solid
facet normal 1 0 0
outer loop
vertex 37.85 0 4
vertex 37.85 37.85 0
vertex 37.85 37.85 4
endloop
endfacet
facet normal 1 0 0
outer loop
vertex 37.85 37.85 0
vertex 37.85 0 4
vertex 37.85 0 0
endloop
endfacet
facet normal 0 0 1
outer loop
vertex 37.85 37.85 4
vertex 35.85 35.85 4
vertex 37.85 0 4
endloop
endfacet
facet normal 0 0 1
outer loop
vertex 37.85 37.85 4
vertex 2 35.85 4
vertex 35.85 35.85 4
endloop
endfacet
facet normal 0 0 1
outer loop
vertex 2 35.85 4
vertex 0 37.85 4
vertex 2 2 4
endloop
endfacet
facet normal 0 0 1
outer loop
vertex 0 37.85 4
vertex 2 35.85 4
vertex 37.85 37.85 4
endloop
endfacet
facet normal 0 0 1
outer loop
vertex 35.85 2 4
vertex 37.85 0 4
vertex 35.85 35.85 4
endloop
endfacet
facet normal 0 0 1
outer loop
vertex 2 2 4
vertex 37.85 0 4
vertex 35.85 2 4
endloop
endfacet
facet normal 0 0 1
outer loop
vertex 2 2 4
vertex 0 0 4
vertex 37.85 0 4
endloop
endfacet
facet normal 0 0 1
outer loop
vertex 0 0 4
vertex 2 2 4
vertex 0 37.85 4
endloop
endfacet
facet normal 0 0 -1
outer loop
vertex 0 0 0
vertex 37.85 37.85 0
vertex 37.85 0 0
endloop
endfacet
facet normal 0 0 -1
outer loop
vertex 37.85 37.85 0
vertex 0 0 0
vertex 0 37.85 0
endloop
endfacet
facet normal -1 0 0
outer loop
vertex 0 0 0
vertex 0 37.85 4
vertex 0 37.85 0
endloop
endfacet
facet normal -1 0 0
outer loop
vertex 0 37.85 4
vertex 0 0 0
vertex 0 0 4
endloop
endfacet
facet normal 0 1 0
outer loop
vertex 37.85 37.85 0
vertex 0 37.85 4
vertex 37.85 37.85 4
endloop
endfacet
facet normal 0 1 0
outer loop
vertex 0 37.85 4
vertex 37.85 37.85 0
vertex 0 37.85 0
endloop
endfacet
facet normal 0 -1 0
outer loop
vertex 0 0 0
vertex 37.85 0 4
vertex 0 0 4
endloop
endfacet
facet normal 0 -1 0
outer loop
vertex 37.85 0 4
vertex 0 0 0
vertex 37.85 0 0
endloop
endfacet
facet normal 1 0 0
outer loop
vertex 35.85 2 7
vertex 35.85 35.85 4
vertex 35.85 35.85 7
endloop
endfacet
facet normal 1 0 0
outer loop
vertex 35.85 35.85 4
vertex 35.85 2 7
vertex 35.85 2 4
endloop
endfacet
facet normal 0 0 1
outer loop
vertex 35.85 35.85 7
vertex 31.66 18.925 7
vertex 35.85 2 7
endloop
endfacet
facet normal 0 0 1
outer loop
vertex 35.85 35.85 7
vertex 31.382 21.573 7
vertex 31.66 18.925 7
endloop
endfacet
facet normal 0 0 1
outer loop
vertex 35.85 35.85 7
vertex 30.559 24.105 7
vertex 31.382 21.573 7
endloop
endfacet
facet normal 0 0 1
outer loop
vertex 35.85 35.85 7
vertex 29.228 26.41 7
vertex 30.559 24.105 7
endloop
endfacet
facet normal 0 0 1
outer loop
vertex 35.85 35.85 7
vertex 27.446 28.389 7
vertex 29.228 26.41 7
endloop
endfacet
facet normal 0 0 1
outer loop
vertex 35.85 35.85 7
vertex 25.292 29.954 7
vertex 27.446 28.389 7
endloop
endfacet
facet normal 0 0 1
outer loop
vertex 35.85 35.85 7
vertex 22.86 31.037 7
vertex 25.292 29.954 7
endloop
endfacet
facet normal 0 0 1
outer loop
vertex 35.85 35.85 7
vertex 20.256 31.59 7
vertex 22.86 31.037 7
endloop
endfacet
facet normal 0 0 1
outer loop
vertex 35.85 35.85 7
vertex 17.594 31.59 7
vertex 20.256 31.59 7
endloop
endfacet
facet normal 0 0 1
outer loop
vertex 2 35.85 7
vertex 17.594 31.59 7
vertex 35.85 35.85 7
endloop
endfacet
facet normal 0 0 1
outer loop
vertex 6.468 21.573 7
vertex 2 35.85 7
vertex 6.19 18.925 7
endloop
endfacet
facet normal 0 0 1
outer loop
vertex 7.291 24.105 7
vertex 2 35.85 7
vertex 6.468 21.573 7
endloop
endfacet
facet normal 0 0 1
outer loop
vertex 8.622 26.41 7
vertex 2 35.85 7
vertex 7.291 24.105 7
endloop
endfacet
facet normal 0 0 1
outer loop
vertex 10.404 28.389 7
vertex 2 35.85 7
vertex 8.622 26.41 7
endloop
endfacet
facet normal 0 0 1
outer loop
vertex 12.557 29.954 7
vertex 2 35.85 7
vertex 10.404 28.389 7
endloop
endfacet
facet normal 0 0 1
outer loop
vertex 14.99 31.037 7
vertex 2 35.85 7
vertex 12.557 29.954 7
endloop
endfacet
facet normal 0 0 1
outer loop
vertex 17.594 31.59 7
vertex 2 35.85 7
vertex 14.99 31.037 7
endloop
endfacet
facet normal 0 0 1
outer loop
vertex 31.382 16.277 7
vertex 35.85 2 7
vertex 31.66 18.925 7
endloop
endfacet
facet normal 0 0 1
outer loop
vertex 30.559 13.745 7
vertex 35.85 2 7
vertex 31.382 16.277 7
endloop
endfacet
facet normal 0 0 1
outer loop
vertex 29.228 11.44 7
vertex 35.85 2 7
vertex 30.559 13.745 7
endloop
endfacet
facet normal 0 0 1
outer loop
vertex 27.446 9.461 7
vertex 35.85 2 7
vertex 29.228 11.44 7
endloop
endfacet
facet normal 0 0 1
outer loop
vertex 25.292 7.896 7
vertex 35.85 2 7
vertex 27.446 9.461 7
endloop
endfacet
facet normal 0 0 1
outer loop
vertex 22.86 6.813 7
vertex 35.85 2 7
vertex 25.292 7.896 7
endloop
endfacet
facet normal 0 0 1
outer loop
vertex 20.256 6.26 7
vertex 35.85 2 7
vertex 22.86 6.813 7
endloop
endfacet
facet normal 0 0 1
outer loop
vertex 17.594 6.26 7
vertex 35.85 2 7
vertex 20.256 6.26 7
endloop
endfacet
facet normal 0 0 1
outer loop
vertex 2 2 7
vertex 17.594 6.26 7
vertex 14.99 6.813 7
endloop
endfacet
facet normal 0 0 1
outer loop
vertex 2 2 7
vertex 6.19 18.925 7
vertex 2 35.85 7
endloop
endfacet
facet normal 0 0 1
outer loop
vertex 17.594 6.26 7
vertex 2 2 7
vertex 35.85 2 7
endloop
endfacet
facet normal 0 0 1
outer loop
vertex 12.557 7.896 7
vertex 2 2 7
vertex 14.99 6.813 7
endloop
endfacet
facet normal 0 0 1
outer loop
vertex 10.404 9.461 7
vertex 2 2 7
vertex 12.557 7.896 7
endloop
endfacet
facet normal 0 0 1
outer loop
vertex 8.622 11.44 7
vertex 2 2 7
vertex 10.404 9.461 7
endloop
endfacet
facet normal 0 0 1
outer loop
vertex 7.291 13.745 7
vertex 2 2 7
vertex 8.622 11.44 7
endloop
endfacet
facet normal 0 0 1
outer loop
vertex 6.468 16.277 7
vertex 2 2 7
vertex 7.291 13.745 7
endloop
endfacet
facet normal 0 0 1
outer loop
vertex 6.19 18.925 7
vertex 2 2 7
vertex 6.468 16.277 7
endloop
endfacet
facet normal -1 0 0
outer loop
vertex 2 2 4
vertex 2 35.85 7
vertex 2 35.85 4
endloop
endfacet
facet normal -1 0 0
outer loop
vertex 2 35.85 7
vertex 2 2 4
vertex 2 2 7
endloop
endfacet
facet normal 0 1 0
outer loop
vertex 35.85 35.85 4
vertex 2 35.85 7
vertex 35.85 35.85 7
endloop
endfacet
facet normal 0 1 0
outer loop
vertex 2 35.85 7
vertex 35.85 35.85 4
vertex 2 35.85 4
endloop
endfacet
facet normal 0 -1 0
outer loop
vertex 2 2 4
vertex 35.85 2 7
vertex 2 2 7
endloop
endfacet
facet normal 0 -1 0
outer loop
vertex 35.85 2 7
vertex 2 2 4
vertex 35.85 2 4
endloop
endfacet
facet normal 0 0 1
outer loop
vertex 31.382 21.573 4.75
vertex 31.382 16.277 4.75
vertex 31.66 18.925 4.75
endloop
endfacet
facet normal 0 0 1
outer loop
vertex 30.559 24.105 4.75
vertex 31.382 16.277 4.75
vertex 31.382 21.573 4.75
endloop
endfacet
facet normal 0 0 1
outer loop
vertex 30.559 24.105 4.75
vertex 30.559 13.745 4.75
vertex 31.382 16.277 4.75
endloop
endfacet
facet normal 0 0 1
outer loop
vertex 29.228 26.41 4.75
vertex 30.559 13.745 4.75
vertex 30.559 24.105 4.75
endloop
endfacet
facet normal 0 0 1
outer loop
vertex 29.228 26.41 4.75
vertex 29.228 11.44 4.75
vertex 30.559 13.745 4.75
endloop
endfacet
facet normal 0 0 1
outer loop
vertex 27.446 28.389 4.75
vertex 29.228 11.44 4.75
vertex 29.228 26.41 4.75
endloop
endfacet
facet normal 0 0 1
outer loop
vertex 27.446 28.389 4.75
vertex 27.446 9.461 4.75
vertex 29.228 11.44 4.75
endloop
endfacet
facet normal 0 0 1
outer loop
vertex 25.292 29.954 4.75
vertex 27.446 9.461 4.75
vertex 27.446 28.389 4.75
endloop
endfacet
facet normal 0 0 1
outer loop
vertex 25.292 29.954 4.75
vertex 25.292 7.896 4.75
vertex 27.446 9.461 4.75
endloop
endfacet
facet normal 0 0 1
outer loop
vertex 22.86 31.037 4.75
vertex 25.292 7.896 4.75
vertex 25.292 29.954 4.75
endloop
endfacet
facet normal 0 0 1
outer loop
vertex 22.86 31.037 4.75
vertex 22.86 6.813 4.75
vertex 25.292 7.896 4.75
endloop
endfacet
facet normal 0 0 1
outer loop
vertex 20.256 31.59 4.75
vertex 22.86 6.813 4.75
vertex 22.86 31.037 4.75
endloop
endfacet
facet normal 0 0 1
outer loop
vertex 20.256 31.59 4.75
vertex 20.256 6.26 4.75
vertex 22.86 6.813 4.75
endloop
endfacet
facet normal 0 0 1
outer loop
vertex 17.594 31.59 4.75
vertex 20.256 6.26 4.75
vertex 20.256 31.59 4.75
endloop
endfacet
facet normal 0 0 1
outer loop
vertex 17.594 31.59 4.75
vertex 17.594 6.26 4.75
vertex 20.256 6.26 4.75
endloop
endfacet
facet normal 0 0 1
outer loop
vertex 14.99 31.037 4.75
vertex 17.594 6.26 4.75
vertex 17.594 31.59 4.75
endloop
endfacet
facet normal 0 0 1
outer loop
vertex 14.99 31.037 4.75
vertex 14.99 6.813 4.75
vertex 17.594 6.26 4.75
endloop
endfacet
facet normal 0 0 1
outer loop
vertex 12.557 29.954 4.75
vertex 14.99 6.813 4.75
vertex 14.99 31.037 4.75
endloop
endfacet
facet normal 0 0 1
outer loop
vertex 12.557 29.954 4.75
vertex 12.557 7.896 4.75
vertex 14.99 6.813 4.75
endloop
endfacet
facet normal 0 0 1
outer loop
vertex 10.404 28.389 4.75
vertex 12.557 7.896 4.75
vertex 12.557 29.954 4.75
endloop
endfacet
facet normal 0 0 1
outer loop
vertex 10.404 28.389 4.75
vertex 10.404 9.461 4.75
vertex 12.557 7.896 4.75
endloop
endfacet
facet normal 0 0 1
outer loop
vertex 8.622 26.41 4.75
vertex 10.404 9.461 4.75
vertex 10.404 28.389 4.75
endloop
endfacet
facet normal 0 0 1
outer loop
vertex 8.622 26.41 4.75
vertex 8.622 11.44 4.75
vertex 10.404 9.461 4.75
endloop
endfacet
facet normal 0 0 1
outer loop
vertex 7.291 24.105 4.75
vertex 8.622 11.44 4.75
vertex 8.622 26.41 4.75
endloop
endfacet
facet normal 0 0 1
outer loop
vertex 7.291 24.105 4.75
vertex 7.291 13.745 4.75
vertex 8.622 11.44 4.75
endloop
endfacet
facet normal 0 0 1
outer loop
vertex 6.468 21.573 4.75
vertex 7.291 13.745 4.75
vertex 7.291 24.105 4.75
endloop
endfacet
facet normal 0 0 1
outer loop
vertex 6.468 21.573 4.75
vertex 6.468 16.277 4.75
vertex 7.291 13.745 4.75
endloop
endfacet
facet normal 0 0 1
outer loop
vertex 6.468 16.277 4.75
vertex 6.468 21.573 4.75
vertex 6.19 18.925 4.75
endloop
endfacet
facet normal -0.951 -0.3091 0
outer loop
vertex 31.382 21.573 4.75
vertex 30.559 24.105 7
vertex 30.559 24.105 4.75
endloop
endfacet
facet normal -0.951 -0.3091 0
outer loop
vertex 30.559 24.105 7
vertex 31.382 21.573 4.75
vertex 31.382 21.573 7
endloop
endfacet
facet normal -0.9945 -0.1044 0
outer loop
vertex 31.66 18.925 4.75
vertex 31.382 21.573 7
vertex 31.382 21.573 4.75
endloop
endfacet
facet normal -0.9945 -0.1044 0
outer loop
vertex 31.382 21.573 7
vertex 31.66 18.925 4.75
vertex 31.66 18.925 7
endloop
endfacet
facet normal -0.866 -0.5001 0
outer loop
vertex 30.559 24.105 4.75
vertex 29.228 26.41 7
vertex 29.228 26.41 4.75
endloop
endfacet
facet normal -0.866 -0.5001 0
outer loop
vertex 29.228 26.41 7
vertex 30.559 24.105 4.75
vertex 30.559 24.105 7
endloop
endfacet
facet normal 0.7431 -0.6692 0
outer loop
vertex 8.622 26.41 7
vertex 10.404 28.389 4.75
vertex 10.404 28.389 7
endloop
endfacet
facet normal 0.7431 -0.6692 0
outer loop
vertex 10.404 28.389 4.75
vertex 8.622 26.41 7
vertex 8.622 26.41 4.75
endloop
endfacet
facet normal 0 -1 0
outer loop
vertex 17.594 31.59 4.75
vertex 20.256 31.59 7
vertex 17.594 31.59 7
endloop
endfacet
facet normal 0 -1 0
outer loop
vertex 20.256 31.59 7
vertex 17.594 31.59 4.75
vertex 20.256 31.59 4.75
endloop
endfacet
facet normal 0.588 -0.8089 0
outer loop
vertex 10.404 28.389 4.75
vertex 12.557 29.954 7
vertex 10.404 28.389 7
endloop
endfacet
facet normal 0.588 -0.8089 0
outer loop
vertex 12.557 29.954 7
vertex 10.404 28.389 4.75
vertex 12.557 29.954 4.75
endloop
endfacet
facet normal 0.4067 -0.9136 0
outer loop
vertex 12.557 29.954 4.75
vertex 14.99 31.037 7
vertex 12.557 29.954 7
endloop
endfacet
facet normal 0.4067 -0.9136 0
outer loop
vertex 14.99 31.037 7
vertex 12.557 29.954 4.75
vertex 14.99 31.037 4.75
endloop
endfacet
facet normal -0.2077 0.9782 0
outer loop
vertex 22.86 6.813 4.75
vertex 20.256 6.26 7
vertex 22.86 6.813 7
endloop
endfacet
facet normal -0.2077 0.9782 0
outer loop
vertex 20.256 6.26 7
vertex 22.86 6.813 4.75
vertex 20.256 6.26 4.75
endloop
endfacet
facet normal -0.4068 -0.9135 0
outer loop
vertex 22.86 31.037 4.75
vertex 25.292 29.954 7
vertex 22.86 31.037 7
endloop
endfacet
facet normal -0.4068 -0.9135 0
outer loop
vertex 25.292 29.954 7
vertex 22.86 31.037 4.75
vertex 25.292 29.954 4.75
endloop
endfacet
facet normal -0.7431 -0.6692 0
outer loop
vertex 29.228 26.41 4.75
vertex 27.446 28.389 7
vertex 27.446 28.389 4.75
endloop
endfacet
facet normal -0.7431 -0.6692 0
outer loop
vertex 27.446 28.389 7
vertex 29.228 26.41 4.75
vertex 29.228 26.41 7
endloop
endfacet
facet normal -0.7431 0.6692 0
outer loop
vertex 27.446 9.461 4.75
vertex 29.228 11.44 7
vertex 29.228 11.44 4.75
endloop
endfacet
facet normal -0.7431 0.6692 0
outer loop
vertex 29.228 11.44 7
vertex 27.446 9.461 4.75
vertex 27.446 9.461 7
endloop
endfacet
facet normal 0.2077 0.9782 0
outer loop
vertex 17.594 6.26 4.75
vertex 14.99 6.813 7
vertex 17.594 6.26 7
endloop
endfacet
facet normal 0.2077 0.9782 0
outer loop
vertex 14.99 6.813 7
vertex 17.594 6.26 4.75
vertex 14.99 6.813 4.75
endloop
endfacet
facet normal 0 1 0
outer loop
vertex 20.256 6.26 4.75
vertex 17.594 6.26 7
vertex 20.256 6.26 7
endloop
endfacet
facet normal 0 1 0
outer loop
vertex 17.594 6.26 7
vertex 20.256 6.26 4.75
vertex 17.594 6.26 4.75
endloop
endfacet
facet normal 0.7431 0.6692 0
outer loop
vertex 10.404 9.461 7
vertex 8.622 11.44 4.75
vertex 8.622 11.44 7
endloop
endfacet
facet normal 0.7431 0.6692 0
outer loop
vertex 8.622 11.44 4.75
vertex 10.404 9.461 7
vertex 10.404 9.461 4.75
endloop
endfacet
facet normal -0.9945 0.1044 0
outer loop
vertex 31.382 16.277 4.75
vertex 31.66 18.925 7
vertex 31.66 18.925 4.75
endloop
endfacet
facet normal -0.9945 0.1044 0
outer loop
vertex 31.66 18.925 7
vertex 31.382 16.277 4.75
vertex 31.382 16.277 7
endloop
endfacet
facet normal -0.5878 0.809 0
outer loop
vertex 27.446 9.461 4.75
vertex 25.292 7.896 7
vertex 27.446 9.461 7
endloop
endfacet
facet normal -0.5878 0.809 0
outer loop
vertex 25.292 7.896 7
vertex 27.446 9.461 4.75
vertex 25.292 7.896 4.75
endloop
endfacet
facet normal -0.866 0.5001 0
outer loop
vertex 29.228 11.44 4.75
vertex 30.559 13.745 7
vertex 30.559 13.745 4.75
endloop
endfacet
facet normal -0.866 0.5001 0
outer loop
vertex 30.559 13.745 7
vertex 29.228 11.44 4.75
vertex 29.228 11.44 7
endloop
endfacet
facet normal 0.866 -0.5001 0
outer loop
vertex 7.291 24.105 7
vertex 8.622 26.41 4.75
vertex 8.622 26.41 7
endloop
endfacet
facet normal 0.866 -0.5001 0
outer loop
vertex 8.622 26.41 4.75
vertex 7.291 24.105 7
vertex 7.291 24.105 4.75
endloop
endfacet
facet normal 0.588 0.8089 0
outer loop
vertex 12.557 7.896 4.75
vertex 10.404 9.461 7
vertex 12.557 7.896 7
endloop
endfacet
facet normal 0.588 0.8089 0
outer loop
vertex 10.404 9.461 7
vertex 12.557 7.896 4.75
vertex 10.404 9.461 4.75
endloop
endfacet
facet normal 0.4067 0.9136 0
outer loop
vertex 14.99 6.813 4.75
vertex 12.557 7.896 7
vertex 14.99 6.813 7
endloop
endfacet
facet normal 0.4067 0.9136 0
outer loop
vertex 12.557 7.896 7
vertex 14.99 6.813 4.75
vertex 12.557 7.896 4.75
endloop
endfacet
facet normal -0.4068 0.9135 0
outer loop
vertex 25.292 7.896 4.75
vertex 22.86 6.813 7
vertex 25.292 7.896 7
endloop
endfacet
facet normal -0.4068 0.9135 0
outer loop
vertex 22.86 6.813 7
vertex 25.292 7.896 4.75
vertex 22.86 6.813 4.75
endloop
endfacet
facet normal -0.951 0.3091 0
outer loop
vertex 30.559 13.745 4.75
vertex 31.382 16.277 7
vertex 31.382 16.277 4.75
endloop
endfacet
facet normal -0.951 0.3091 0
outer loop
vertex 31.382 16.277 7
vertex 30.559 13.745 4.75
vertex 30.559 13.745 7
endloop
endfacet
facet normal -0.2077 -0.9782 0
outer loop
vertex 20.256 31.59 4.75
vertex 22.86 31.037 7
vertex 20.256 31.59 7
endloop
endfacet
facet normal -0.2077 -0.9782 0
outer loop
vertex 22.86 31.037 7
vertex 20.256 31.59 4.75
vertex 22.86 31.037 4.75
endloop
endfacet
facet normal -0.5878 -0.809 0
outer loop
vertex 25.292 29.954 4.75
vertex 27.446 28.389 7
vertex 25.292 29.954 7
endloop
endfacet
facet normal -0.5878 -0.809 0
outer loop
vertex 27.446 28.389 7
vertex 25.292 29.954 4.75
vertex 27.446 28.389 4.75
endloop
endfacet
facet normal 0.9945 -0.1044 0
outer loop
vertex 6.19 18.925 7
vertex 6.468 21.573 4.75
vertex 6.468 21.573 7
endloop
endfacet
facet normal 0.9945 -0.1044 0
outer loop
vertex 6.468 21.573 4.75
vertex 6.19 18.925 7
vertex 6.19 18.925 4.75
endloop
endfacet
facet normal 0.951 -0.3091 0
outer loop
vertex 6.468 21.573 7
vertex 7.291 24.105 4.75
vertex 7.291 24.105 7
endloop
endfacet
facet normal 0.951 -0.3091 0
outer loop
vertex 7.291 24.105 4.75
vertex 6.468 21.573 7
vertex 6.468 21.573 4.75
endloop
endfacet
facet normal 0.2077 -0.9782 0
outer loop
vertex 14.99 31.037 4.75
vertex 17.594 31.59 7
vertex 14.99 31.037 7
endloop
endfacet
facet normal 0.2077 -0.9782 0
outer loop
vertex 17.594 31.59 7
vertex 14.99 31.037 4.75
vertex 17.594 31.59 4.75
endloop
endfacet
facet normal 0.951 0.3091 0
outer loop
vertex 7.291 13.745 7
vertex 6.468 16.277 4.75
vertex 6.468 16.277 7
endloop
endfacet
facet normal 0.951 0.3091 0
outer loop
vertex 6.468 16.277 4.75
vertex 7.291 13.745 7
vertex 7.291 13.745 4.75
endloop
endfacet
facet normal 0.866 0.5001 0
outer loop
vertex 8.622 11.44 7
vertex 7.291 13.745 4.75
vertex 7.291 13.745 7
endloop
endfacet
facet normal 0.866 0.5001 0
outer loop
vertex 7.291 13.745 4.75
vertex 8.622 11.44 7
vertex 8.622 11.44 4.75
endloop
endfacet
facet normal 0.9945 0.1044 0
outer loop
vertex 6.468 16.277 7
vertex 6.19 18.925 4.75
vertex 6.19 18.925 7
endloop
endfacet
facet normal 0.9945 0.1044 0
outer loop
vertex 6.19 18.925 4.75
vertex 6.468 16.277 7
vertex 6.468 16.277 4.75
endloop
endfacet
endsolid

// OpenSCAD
BoxHeight = 50;
BoxWidth = 37.85;
WallWidth = 2;
BaseDiameter = 25.47;
BaseHeight = 2.25;


/*
difference(){
	union(){
		cube([BoxWidth,BoxWidth,BaseHeight]);
		translate([WallWidth,WallWidth,BaseHeight]) cube([BoxWidth-WallWidth*2,BoxWidth-WallWidth*2,WallWidth]);
	}
	translate([(BoxWidth/2),(BoxWidth/2),WallWidth]) cylinder(d=BaseDiameter,h=BaseHeight,center=false);
}

difference(){
	cube([BoxWidth,BoxWidth,BoxHeight]);
	#translate([WallWidth,WallWidth,WallWidth]) cube([BoxWidth-WallWidth*2,BoxWidth-WallWidth*2,BoxHeight-WallWidth]);
}
*/

difference(){
	union(){
		cube([BoxWidth,BoxWidth,4]);
		translate([WallWidth,WallWidth,4]) cube([BoxWidth-WallWidth*2,BoxWidth-WallWidth*2,3]);
	}
	translate([(BoxWidth/2),(BoxWidth/2),4.75]) cylinder(d=BaseDiameter,h=BaseHeight,center=false);
}
